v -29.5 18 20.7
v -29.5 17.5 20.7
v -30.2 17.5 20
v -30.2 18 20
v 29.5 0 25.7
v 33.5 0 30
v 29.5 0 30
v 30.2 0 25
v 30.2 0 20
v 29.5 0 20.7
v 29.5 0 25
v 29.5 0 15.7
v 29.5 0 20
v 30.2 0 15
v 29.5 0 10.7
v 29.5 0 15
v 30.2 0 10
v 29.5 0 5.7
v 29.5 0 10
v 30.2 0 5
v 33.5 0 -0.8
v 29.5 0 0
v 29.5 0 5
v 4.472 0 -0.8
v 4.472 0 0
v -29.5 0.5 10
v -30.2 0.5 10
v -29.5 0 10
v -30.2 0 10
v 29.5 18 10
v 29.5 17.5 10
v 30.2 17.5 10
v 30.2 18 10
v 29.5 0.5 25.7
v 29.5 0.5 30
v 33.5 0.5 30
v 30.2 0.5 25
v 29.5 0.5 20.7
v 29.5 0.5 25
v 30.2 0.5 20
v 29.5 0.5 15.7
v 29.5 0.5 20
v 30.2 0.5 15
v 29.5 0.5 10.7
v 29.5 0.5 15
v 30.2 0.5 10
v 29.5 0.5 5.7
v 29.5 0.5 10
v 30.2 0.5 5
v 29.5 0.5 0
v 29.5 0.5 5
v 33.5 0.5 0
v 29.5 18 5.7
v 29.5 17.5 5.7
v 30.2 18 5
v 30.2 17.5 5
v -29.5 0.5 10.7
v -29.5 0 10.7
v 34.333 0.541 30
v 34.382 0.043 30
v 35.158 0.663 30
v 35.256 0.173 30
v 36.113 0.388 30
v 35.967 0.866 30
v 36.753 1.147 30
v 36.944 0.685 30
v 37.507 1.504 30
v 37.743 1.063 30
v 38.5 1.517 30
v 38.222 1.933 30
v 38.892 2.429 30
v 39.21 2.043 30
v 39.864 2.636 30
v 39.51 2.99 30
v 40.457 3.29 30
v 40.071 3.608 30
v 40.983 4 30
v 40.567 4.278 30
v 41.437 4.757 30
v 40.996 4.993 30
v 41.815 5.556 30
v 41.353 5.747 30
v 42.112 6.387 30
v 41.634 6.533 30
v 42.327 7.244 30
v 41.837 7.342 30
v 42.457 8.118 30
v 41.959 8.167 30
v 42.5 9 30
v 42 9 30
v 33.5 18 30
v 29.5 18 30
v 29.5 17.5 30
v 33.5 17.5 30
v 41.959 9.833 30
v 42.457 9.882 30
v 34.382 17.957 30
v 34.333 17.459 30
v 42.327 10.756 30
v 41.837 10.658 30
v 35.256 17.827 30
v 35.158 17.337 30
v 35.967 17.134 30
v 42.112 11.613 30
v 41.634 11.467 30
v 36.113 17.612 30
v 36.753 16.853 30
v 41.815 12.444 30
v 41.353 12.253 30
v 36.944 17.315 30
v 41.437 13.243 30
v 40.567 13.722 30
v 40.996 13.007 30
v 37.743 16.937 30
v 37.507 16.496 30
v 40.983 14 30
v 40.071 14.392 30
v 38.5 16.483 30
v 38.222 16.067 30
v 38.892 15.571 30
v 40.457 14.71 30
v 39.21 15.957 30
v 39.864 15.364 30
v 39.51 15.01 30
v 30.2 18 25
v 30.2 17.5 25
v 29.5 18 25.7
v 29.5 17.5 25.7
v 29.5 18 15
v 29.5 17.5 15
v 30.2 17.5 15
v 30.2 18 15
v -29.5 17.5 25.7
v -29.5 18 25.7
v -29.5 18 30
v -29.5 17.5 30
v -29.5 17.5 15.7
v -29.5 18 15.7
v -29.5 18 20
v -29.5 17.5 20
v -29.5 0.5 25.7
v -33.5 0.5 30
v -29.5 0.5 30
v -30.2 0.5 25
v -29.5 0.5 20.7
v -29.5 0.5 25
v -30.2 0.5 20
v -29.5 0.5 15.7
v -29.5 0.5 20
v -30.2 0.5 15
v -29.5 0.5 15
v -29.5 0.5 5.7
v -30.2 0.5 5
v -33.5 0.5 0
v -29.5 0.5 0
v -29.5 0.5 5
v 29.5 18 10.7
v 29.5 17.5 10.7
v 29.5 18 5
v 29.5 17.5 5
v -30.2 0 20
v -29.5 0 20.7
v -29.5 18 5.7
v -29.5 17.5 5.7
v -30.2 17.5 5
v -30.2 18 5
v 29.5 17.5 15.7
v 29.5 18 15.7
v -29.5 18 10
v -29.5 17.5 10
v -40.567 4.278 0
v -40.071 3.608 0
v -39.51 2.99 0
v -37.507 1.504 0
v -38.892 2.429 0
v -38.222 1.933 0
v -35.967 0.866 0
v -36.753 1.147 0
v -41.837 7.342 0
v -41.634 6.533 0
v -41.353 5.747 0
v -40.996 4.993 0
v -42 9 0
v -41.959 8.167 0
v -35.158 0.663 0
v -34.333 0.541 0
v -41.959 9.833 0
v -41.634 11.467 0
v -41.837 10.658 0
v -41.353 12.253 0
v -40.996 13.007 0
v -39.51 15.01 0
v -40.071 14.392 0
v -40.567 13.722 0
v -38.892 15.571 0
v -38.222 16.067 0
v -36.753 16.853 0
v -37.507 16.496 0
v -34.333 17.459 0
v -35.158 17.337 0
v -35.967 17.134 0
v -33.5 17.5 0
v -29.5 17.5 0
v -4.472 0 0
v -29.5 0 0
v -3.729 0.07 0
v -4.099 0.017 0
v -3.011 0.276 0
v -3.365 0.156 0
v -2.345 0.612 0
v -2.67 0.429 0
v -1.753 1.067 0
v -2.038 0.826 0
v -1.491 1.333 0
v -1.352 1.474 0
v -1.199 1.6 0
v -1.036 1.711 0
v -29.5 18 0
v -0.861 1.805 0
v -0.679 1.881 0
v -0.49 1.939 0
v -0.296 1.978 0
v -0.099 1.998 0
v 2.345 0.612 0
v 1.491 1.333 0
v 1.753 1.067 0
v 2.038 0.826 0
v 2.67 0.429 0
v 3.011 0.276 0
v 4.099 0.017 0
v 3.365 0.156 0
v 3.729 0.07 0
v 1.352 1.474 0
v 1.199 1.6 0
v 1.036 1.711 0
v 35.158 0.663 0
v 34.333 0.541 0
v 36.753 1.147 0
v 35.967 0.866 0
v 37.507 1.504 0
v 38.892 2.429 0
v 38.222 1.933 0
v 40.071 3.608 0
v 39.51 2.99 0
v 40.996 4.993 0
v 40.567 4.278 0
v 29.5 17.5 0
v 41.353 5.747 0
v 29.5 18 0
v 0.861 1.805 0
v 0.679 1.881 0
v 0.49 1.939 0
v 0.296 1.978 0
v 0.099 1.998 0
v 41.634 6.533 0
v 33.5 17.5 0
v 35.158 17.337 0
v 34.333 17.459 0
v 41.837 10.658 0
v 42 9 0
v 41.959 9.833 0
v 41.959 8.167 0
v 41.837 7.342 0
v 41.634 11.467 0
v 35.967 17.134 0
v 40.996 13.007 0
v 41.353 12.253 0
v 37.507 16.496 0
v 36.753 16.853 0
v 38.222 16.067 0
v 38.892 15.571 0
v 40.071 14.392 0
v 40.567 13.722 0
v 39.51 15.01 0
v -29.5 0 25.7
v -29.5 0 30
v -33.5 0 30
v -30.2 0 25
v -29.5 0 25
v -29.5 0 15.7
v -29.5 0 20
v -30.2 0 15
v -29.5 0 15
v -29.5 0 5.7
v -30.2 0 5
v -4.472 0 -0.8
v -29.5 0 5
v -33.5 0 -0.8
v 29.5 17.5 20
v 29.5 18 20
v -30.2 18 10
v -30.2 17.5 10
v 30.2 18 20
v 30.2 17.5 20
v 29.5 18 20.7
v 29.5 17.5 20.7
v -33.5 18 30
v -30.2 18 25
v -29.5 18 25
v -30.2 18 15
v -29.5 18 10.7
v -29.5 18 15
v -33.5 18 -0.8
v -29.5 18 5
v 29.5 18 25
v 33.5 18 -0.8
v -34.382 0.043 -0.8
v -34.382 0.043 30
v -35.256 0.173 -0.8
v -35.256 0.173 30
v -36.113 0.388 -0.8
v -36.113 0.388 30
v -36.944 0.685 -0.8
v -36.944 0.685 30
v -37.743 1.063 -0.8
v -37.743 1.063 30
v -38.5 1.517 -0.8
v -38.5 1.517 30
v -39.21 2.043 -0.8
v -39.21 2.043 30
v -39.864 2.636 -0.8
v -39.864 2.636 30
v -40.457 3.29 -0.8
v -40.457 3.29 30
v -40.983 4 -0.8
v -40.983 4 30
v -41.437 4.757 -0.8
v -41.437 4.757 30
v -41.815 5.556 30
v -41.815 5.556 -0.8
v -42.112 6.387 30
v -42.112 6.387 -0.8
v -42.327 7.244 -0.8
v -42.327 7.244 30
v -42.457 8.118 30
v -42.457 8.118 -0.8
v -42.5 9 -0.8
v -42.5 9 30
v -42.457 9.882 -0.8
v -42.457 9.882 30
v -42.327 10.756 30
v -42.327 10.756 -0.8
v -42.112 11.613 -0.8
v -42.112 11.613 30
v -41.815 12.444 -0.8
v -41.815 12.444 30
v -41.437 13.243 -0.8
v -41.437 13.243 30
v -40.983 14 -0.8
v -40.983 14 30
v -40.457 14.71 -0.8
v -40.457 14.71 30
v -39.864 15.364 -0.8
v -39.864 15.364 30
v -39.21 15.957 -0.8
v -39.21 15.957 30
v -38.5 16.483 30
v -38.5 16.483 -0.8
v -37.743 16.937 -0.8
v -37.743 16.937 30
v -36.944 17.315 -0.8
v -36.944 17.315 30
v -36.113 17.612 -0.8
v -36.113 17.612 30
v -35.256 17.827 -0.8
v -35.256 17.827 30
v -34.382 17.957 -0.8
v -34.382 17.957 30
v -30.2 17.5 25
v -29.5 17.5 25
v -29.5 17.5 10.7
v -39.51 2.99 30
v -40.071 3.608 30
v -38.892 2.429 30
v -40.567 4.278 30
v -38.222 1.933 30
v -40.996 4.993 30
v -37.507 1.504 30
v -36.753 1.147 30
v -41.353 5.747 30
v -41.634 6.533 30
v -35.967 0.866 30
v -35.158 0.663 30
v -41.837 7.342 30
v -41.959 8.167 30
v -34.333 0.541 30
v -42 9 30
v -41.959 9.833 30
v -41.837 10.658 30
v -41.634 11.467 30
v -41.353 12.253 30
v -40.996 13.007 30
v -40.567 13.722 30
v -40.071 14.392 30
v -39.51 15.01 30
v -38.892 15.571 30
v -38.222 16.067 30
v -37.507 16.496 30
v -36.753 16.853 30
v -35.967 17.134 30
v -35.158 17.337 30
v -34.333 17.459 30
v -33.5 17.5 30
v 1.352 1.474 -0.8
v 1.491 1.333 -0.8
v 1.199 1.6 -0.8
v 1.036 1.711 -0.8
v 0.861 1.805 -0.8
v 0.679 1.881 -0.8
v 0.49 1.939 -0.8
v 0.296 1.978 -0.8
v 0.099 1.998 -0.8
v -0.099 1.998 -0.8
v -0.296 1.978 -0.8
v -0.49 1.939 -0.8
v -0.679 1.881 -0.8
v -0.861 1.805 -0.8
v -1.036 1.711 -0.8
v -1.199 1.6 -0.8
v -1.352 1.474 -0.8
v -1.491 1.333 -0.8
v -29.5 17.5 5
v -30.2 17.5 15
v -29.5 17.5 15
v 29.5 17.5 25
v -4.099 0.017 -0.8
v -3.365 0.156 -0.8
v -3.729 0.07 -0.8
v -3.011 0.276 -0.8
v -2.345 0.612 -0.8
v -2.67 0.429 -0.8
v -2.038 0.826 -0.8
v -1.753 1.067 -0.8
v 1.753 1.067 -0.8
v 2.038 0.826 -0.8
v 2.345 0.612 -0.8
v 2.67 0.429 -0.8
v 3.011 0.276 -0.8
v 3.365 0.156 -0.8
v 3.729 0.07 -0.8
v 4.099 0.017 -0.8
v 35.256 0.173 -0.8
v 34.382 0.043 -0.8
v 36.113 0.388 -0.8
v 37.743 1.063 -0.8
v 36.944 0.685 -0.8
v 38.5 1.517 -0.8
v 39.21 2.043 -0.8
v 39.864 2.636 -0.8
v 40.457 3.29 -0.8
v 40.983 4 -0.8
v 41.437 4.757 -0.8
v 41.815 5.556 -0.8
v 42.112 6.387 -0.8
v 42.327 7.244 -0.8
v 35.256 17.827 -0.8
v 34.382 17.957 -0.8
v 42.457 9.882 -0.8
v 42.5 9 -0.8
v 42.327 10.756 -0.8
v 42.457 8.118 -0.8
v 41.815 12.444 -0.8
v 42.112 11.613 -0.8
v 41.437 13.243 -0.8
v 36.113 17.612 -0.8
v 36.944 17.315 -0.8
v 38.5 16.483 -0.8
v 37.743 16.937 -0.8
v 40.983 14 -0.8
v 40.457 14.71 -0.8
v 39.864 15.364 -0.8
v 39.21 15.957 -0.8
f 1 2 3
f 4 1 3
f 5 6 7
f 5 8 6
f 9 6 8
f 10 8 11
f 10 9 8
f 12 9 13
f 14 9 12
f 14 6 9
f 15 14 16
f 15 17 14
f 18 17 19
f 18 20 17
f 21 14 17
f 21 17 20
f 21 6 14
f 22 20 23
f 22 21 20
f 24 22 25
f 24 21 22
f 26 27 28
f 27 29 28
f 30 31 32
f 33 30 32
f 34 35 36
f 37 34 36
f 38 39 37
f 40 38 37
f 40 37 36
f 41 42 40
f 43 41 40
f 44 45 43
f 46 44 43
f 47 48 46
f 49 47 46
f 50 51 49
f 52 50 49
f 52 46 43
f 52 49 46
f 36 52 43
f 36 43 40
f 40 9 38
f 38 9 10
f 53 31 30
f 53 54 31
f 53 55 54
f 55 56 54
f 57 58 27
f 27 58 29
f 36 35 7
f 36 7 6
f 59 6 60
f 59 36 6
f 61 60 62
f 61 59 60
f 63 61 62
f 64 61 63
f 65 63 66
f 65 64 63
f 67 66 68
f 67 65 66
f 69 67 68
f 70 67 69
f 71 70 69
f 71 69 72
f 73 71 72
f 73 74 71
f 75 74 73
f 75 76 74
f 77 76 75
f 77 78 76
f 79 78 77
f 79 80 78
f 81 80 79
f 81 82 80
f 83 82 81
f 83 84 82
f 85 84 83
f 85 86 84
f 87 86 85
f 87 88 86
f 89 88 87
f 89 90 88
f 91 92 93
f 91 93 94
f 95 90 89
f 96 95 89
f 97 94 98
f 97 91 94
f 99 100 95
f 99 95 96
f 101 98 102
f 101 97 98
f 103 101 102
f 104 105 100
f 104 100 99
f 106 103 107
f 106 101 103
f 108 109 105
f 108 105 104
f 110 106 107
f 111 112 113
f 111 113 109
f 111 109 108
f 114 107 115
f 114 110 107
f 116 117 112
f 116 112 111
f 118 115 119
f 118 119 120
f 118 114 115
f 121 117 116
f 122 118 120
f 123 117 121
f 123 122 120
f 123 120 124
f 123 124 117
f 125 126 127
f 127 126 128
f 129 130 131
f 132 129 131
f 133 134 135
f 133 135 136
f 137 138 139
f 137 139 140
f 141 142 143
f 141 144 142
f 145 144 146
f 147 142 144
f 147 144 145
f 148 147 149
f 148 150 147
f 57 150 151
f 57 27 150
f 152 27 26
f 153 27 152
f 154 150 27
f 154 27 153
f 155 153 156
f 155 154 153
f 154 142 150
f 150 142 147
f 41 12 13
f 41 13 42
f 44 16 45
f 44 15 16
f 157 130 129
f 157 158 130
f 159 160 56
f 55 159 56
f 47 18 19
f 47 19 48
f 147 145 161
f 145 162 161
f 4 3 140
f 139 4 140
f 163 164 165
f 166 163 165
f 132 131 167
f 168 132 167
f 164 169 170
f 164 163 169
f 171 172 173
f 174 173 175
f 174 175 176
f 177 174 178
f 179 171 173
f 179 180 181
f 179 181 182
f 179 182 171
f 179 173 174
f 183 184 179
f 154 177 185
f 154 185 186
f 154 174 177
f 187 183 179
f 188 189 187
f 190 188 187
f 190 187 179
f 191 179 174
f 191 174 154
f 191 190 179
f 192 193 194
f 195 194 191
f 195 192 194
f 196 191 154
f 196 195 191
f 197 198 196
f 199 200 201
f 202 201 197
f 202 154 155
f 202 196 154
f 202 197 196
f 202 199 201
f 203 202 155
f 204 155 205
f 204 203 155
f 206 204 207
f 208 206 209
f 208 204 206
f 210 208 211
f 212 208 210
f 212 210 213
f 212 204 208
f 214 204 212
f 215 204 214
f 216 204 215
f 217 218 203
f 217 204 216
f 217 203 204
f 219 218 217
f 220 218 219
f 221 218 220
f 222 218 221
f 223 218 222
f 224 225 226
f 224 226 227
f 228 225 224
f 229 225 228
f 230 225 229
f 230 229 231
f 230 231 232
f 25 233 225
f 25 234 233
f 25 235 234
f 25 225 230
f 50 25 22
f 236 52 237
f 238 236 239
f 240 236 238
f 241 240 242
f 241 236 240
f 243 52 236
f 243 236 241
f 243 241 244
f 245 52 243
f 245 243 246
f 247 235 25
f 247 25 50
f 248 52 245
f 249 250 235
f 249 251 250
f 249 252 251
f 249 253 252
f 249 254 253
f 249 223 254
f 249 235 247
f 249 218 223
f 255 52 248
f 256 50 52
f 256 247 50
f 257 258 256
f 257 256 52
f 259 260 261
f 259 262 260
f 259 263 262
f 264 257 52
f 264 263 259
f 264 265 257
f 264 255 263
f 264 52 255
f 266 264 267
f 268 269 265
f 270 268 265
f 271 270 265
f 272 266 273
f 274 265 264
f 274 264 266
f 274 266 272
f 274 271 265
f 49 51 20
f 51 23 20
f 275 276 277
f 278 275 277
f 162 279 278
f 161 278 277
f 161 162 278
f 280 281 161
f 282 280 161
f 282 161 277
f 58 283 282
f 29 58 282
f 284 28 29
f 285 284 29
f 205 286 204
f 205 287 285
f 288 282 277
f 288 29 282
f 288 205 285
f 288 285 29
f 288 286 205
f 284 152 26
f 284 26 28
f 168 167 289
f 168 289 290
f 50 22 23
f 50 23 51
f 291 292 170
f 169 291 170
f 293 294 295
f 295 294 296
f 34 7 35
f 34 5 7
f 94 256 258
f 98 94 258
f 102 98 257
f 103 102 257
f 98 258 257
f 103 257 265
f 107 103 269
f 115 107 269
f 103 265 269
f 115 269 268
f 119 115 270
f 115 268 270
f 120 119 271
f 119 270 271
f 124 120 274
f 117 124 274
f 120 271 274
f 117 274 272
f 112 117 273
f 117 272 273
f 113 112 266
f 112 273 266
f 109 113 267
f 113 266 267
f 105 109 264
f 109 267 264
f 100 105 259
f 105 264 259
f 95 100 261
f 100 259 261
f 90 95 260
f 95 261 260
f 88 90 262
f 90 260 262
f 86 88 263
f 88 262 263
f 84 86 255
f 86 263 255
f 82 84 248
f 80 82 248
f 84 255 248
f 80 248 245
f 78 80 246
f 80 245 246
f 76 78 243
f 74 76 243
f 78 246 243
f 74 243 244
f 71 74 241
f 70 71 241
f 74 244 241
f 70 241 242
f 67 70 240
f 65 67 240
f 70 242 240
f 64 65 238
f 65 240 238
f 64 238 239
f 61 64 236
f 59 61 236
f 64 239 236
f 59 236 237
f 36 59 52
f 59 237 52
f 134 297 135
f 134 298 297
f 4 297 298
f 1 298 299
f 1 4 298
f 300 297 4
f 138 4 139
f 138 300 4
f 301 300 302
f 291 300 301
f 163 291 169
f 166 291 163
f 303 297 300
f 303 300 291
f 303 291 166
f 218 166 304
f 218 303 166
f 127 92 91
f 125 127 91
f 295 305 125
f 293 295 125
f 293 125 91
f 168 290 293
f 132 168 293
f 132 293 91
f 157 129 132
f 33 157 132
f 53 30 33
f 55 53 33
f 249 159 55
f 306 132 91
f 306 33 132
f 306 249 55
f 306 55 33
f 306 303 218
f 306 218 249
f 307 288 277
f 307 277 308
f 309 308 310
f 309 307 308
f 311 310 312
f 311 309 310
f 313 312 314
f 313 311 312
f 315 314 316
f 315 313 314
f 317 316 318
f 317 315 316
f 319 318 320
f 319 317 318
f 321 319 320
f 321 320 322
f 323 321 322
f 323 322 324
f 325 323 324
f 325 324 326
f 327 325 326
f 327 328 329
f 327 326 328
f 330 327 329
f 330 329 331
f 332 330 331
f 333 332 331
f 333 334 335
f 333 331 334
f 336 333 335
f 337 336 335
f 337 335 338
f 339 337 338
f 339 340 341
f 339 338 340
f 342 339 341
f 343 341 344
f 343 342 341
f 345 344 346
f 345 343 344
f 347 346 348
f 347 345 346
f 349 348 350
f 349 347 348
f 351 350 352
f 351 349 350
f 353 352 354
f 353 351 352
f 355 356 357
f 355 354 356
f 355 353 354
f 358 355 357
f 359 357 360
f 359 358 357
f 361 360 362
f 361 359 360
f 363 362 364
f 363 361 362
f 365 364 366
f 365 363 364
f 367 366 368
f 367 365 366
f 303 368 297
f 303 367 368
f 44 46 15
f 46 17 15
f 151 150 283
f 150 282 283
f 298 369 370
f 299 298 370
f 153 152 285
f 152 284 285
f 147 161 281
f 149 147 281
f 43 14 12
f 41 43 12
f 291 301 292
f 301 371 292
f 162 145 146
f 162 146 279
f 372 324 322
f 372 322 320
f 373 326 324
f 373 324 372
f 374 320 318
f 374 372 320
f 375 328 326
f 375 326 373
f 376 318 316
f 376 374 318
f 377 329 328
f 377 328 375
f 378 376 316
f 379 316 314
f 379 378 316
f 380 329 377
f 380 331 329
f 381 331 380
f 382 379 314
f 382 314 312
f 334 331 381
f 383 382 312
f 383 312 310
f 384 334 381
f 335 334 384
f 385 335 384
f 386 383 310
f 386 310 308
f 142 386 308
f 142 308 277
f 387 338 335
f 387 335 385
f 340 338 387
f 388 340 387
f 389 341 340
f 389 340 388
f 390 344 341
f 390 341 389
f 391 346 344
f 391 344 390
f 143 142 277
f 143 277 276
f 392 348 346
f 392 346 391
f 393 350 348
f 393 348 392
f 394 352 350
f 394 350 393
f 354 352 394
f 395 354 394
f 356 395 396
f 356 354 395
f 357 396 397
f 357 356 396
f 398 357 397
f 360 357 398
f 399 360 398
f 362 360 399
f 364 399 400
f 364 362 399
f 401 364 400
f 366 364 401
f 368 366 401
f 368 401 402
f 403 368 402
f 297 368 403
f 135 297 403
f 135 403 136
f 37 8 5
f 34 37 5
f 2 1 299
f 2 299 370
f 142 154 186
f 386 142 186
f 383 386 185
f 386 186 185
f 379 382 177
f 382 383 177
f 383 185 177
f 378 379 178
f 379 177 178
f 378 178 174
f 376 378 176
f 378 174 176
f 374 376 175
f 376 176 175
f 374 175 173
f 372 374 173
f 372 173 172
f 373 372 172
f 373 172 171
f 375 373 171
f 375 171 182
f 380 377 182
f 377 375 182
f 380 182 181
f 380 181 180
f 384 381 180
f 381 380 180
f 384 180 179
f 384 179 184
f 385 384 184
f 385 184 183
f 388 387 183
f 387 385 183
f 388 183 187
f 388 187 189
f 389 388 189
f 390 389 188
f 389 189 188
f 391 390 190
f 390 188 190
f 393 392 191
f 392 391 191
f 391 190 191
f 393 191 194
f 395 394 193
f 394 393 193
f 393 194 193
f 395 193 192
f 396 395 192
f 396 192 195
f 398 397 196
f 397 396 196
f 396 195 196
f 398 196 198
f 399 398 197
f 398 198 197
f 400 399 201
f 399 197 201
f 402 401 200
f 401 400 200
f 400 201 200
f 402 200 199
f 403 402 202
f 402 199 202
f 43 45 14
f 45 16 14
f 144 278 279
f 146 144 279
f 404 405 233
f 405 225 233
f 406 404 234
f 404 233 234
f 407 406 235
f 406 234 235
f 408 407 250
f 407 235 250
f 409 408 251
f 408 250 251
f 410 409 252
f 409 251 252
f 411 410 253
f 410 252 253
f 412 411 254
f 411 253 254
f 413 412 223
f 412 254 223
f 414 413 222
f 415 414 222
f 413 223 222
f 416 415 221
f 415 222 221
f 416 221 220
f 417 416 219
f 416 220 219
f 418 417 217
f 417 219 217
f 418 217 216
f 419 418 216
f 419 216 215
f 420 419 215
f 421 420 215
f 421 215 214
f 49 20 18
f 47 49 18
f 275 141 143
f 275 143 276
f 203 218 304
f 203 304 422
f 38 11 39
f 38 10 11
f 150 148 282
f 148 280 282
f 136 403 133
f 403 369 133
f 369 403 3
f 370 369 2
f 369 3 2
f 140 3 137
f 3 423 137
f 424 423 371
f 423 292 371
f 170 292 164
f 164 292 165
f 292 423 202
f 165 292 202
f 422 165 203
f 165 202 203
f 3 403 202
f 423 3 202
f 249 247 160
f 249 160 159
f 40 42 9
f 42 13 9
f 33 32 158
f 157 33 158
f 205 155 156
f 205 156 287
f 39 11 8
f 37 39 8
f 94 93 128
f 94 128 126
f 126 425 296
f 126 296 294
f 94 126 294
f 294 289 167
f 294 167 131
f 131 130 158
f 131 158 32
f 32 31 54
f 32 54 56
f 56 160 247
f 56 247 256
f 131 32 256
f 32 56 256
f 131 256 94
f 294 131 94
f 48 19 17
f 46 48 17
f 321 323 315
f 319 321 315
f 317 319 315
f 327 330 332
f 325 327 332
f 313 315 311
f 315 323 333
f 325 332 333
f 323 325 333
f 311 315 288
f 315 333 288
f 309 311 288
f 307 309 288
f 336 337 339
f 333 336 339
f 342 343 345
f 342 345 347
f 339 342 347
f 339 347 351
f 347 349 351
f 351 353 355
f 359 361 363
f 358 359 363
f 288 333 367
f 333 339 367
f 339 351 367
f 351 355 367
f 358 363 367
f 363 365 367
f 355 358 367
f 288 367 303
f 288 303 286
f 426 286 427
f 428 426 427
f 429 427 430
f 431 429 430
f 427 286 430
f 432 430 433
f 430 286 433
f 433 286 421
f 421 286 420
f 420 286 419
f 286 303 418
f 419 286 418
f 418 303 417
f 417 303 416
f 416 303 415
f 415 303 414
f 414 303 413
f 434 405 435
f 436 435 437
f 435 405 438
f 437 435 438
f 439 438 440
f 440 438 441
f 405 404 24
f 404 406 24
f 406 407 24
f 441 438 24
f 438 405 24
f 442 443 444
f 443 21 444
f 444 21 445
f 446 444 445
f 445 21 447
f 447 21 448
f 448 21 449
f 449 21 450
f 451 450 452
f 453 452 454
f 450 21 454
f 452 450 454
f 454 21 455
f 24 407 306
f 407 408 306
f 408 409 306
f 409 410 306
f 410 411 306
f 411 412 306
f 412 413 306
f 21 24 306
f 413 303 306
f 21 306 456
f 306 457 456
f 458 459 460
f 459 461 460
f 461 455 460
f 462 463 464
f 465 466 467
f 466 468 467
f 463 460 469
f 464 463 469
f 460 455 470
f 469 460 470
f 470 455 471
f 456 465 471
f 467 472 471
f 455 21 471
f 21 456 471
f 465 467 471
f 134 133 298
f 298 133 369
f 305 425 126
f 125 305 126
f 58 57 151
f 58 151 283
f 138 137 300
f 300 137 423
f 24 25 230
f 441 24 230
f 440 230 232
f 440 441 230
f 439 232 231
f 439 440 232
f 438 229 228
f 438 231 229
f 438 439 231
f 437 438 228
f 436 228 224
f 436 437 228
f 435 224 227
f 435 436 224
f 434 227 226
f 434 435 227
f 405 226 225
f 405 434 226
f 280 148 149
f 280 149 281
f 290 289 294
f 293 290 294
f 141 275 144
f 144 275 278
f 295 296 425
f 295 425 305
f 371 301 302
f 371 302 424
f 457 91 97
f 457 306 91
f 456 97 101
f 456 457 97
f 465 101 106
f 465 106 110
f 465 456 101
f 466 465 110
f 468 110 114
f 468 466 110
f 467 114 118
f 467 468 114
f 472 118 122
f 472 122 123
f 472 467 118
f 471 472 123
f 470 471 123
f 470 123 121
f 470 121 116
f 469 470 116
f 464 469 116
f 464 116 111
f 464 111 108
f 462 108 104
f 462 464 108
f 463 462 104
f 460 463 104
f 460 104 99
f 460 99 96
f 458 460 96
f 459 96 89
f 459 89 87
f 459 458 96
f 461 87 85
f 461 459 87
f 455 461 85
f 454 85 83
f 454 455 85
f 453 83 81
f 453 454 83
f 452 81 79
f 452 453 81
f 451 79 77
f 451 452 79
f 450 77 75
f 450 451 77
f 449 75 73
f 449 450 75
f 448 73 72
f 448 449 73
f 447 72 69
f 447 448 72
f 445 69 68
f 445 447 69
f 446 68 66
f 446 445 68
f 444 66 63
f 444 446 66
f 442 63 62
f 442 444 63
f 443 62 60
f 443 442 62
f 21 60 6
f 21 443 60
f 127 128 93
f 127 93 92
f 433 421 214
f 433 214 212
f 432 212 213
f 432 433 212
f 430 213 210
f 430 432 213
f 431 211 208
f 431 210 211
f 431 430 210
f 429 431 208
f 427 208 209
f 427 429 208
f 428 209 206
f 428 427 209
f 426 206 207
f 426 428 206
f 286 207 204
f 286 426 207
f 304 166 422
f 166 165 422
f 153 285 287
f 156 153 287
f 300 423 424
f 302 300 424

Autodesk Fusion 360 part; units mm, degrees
sketch "Sketch1" plane through (0, 0, 0) normal (0, 0, 1) x (1, 0, 0)
  line L0 (0, 0) -> (-42.5, 0)
  line L1 (-42.5, 0) -> (-42.5, 18) construction
  line L2 (-42.5, 18) -> (0, 18)
  line L3 (0, 18) -> (0, 0)
  arc A0 (-33.5, 18) -> (-33.5, 0) centre (-33.5, 9) ccw
  line L4 (-33.5, 18) -> (-29.5, 18)
  line L5 (-33.5, 0) -> (-29.5, 0)
  line L6 (-33.5, 0.5) -> (-29.5, 0.5)
  arc A1 (-33.5, 17.5) -> (-33.5, 0.5) centre (-33.5, 9) ccw
  line L7 (-33.5, 17.5) -> (-29.5, 17.5)
  line L8 (-29.5, 18) -> (-29.5, 17.5)
  line L9 (-29.5, 0.5) -> (-29.5, 0)
  dimension "d6" = 42.5
  dimension "d7" = 18
  dimension "d8" = 4
  dimension "d9" = 4
extrude "Extrude1" add sketch "Sketch1" against normal blind 0.8
extrude "Extrude2" add sketch "Sketch1" along normal blind 30 contours L0 L2 A0 L4 L5 L6 A1 L7 L8 L9
sketch "Sketch2" plane through (0, 0, 0) normal (0, -1, 0) x (1, 0, 0)
  line L0 (-33.5, 30) -> (-33.5, -0.8)
  line L1 (-33.5, -0.8) -> (0, -0.8)
  line L2 (0, -0.8) -> (0, 0)
  line L3 (0, 0) -> (-29.5, 0)
  line L4 (-29.5, 0) -> (-29.5, 30)
  line L5 (-29.5, 30) -> (-33.5, 30)
  line L6 (-33.5, 0) -> (-29.5, 0)
  line L7 (-29.5, 5.7) -> (-30.2, 5)
  line L8 (-30.2, 5) -> (-29.5, 5)
  line L9 (-29.5, 5.7) -> (-29.5, 5)
  dimension "d31" = 0.7
  dimension "d32" = 45
  dimension "d33" = 5
extrude "Extrude3" cut sketch "Sketch2" against normal through all contours L4 L7 L8 L9
pattern_linear "R-Pattern1" count 5 spacing 5 along (0, 0, 1) of "Extrude3"
mirror "Mirror1" about plane through (0, 0, 0) normal (1, 0, 0) of bodies 1 merged
sketch "Sketch3" plane through (0, 0, 0) normal (0, 0, 1) x (-1, 0, 0)
  arc A0 (-33.5, -0.5) -> (-33.5, -17.5) centre (-33.5, -9) ccw
  arc A1 (33.5, -17.5) -> (33.5, -0.5) centre (33.5, -9) ccw
  circle A2 centre (0, 0) radius 2
  line L0 (29.5, -0.5) -> (29.5, 0)
  line L1 (29.5, 0) -> (-29.5, 0)
  line L2 (-29.5, 0) -> (-29.5, -0.5)
  line L3 (-29.5, -0.5) -> (-33.5, -0.5)
  line L4 (-33.5, -17.5) -> (-29.5, -17.5)
  line L5 (-29.5, -17.5) -> (-29.5, -18)
  line L6 (-29.5, -18) -> (29.5, -18)
  line L7 (29.5, -18) -> (29.5, -17.5)
  line L8 (29.5, -17.5) -> (33.5, -17.5)
  line L9 (33.5, -0.5) -> (29.5, -0.5)
  dimension "d27" = 4
extrude "Extrude4" cut sketch "Sketch3" against normal through all contours A2 L1 picked at (1.1554, -0.8465)
fillet "Fillet1" radius 4 2 edges at (-2, 0, -0.4) (2, 0, -0.4)
equation "baseThickness = 0.8 mm"
equation "baseLength = 85 mm"
equation "baseWidth = 18 mm"
equation "numSegments = 6"
equation "segmentHeight = 5 mm"
equation "d10 = -extrusionWidth"
equation "extrusionWidth = 0.5 mm"
equation "d12 = -baseThickness"
equation "d14 = numSegments * segmentHeight"
equation "layerHeight = 0.2 mm"
equation "d21 = numSegments - 1"
equation "d23 = segmentHeight"
equation "d31 = segmentNotchHeight"
equation "d33 = segmentHeight"
equation "segmentNotchHeight = 0.7 mm"
